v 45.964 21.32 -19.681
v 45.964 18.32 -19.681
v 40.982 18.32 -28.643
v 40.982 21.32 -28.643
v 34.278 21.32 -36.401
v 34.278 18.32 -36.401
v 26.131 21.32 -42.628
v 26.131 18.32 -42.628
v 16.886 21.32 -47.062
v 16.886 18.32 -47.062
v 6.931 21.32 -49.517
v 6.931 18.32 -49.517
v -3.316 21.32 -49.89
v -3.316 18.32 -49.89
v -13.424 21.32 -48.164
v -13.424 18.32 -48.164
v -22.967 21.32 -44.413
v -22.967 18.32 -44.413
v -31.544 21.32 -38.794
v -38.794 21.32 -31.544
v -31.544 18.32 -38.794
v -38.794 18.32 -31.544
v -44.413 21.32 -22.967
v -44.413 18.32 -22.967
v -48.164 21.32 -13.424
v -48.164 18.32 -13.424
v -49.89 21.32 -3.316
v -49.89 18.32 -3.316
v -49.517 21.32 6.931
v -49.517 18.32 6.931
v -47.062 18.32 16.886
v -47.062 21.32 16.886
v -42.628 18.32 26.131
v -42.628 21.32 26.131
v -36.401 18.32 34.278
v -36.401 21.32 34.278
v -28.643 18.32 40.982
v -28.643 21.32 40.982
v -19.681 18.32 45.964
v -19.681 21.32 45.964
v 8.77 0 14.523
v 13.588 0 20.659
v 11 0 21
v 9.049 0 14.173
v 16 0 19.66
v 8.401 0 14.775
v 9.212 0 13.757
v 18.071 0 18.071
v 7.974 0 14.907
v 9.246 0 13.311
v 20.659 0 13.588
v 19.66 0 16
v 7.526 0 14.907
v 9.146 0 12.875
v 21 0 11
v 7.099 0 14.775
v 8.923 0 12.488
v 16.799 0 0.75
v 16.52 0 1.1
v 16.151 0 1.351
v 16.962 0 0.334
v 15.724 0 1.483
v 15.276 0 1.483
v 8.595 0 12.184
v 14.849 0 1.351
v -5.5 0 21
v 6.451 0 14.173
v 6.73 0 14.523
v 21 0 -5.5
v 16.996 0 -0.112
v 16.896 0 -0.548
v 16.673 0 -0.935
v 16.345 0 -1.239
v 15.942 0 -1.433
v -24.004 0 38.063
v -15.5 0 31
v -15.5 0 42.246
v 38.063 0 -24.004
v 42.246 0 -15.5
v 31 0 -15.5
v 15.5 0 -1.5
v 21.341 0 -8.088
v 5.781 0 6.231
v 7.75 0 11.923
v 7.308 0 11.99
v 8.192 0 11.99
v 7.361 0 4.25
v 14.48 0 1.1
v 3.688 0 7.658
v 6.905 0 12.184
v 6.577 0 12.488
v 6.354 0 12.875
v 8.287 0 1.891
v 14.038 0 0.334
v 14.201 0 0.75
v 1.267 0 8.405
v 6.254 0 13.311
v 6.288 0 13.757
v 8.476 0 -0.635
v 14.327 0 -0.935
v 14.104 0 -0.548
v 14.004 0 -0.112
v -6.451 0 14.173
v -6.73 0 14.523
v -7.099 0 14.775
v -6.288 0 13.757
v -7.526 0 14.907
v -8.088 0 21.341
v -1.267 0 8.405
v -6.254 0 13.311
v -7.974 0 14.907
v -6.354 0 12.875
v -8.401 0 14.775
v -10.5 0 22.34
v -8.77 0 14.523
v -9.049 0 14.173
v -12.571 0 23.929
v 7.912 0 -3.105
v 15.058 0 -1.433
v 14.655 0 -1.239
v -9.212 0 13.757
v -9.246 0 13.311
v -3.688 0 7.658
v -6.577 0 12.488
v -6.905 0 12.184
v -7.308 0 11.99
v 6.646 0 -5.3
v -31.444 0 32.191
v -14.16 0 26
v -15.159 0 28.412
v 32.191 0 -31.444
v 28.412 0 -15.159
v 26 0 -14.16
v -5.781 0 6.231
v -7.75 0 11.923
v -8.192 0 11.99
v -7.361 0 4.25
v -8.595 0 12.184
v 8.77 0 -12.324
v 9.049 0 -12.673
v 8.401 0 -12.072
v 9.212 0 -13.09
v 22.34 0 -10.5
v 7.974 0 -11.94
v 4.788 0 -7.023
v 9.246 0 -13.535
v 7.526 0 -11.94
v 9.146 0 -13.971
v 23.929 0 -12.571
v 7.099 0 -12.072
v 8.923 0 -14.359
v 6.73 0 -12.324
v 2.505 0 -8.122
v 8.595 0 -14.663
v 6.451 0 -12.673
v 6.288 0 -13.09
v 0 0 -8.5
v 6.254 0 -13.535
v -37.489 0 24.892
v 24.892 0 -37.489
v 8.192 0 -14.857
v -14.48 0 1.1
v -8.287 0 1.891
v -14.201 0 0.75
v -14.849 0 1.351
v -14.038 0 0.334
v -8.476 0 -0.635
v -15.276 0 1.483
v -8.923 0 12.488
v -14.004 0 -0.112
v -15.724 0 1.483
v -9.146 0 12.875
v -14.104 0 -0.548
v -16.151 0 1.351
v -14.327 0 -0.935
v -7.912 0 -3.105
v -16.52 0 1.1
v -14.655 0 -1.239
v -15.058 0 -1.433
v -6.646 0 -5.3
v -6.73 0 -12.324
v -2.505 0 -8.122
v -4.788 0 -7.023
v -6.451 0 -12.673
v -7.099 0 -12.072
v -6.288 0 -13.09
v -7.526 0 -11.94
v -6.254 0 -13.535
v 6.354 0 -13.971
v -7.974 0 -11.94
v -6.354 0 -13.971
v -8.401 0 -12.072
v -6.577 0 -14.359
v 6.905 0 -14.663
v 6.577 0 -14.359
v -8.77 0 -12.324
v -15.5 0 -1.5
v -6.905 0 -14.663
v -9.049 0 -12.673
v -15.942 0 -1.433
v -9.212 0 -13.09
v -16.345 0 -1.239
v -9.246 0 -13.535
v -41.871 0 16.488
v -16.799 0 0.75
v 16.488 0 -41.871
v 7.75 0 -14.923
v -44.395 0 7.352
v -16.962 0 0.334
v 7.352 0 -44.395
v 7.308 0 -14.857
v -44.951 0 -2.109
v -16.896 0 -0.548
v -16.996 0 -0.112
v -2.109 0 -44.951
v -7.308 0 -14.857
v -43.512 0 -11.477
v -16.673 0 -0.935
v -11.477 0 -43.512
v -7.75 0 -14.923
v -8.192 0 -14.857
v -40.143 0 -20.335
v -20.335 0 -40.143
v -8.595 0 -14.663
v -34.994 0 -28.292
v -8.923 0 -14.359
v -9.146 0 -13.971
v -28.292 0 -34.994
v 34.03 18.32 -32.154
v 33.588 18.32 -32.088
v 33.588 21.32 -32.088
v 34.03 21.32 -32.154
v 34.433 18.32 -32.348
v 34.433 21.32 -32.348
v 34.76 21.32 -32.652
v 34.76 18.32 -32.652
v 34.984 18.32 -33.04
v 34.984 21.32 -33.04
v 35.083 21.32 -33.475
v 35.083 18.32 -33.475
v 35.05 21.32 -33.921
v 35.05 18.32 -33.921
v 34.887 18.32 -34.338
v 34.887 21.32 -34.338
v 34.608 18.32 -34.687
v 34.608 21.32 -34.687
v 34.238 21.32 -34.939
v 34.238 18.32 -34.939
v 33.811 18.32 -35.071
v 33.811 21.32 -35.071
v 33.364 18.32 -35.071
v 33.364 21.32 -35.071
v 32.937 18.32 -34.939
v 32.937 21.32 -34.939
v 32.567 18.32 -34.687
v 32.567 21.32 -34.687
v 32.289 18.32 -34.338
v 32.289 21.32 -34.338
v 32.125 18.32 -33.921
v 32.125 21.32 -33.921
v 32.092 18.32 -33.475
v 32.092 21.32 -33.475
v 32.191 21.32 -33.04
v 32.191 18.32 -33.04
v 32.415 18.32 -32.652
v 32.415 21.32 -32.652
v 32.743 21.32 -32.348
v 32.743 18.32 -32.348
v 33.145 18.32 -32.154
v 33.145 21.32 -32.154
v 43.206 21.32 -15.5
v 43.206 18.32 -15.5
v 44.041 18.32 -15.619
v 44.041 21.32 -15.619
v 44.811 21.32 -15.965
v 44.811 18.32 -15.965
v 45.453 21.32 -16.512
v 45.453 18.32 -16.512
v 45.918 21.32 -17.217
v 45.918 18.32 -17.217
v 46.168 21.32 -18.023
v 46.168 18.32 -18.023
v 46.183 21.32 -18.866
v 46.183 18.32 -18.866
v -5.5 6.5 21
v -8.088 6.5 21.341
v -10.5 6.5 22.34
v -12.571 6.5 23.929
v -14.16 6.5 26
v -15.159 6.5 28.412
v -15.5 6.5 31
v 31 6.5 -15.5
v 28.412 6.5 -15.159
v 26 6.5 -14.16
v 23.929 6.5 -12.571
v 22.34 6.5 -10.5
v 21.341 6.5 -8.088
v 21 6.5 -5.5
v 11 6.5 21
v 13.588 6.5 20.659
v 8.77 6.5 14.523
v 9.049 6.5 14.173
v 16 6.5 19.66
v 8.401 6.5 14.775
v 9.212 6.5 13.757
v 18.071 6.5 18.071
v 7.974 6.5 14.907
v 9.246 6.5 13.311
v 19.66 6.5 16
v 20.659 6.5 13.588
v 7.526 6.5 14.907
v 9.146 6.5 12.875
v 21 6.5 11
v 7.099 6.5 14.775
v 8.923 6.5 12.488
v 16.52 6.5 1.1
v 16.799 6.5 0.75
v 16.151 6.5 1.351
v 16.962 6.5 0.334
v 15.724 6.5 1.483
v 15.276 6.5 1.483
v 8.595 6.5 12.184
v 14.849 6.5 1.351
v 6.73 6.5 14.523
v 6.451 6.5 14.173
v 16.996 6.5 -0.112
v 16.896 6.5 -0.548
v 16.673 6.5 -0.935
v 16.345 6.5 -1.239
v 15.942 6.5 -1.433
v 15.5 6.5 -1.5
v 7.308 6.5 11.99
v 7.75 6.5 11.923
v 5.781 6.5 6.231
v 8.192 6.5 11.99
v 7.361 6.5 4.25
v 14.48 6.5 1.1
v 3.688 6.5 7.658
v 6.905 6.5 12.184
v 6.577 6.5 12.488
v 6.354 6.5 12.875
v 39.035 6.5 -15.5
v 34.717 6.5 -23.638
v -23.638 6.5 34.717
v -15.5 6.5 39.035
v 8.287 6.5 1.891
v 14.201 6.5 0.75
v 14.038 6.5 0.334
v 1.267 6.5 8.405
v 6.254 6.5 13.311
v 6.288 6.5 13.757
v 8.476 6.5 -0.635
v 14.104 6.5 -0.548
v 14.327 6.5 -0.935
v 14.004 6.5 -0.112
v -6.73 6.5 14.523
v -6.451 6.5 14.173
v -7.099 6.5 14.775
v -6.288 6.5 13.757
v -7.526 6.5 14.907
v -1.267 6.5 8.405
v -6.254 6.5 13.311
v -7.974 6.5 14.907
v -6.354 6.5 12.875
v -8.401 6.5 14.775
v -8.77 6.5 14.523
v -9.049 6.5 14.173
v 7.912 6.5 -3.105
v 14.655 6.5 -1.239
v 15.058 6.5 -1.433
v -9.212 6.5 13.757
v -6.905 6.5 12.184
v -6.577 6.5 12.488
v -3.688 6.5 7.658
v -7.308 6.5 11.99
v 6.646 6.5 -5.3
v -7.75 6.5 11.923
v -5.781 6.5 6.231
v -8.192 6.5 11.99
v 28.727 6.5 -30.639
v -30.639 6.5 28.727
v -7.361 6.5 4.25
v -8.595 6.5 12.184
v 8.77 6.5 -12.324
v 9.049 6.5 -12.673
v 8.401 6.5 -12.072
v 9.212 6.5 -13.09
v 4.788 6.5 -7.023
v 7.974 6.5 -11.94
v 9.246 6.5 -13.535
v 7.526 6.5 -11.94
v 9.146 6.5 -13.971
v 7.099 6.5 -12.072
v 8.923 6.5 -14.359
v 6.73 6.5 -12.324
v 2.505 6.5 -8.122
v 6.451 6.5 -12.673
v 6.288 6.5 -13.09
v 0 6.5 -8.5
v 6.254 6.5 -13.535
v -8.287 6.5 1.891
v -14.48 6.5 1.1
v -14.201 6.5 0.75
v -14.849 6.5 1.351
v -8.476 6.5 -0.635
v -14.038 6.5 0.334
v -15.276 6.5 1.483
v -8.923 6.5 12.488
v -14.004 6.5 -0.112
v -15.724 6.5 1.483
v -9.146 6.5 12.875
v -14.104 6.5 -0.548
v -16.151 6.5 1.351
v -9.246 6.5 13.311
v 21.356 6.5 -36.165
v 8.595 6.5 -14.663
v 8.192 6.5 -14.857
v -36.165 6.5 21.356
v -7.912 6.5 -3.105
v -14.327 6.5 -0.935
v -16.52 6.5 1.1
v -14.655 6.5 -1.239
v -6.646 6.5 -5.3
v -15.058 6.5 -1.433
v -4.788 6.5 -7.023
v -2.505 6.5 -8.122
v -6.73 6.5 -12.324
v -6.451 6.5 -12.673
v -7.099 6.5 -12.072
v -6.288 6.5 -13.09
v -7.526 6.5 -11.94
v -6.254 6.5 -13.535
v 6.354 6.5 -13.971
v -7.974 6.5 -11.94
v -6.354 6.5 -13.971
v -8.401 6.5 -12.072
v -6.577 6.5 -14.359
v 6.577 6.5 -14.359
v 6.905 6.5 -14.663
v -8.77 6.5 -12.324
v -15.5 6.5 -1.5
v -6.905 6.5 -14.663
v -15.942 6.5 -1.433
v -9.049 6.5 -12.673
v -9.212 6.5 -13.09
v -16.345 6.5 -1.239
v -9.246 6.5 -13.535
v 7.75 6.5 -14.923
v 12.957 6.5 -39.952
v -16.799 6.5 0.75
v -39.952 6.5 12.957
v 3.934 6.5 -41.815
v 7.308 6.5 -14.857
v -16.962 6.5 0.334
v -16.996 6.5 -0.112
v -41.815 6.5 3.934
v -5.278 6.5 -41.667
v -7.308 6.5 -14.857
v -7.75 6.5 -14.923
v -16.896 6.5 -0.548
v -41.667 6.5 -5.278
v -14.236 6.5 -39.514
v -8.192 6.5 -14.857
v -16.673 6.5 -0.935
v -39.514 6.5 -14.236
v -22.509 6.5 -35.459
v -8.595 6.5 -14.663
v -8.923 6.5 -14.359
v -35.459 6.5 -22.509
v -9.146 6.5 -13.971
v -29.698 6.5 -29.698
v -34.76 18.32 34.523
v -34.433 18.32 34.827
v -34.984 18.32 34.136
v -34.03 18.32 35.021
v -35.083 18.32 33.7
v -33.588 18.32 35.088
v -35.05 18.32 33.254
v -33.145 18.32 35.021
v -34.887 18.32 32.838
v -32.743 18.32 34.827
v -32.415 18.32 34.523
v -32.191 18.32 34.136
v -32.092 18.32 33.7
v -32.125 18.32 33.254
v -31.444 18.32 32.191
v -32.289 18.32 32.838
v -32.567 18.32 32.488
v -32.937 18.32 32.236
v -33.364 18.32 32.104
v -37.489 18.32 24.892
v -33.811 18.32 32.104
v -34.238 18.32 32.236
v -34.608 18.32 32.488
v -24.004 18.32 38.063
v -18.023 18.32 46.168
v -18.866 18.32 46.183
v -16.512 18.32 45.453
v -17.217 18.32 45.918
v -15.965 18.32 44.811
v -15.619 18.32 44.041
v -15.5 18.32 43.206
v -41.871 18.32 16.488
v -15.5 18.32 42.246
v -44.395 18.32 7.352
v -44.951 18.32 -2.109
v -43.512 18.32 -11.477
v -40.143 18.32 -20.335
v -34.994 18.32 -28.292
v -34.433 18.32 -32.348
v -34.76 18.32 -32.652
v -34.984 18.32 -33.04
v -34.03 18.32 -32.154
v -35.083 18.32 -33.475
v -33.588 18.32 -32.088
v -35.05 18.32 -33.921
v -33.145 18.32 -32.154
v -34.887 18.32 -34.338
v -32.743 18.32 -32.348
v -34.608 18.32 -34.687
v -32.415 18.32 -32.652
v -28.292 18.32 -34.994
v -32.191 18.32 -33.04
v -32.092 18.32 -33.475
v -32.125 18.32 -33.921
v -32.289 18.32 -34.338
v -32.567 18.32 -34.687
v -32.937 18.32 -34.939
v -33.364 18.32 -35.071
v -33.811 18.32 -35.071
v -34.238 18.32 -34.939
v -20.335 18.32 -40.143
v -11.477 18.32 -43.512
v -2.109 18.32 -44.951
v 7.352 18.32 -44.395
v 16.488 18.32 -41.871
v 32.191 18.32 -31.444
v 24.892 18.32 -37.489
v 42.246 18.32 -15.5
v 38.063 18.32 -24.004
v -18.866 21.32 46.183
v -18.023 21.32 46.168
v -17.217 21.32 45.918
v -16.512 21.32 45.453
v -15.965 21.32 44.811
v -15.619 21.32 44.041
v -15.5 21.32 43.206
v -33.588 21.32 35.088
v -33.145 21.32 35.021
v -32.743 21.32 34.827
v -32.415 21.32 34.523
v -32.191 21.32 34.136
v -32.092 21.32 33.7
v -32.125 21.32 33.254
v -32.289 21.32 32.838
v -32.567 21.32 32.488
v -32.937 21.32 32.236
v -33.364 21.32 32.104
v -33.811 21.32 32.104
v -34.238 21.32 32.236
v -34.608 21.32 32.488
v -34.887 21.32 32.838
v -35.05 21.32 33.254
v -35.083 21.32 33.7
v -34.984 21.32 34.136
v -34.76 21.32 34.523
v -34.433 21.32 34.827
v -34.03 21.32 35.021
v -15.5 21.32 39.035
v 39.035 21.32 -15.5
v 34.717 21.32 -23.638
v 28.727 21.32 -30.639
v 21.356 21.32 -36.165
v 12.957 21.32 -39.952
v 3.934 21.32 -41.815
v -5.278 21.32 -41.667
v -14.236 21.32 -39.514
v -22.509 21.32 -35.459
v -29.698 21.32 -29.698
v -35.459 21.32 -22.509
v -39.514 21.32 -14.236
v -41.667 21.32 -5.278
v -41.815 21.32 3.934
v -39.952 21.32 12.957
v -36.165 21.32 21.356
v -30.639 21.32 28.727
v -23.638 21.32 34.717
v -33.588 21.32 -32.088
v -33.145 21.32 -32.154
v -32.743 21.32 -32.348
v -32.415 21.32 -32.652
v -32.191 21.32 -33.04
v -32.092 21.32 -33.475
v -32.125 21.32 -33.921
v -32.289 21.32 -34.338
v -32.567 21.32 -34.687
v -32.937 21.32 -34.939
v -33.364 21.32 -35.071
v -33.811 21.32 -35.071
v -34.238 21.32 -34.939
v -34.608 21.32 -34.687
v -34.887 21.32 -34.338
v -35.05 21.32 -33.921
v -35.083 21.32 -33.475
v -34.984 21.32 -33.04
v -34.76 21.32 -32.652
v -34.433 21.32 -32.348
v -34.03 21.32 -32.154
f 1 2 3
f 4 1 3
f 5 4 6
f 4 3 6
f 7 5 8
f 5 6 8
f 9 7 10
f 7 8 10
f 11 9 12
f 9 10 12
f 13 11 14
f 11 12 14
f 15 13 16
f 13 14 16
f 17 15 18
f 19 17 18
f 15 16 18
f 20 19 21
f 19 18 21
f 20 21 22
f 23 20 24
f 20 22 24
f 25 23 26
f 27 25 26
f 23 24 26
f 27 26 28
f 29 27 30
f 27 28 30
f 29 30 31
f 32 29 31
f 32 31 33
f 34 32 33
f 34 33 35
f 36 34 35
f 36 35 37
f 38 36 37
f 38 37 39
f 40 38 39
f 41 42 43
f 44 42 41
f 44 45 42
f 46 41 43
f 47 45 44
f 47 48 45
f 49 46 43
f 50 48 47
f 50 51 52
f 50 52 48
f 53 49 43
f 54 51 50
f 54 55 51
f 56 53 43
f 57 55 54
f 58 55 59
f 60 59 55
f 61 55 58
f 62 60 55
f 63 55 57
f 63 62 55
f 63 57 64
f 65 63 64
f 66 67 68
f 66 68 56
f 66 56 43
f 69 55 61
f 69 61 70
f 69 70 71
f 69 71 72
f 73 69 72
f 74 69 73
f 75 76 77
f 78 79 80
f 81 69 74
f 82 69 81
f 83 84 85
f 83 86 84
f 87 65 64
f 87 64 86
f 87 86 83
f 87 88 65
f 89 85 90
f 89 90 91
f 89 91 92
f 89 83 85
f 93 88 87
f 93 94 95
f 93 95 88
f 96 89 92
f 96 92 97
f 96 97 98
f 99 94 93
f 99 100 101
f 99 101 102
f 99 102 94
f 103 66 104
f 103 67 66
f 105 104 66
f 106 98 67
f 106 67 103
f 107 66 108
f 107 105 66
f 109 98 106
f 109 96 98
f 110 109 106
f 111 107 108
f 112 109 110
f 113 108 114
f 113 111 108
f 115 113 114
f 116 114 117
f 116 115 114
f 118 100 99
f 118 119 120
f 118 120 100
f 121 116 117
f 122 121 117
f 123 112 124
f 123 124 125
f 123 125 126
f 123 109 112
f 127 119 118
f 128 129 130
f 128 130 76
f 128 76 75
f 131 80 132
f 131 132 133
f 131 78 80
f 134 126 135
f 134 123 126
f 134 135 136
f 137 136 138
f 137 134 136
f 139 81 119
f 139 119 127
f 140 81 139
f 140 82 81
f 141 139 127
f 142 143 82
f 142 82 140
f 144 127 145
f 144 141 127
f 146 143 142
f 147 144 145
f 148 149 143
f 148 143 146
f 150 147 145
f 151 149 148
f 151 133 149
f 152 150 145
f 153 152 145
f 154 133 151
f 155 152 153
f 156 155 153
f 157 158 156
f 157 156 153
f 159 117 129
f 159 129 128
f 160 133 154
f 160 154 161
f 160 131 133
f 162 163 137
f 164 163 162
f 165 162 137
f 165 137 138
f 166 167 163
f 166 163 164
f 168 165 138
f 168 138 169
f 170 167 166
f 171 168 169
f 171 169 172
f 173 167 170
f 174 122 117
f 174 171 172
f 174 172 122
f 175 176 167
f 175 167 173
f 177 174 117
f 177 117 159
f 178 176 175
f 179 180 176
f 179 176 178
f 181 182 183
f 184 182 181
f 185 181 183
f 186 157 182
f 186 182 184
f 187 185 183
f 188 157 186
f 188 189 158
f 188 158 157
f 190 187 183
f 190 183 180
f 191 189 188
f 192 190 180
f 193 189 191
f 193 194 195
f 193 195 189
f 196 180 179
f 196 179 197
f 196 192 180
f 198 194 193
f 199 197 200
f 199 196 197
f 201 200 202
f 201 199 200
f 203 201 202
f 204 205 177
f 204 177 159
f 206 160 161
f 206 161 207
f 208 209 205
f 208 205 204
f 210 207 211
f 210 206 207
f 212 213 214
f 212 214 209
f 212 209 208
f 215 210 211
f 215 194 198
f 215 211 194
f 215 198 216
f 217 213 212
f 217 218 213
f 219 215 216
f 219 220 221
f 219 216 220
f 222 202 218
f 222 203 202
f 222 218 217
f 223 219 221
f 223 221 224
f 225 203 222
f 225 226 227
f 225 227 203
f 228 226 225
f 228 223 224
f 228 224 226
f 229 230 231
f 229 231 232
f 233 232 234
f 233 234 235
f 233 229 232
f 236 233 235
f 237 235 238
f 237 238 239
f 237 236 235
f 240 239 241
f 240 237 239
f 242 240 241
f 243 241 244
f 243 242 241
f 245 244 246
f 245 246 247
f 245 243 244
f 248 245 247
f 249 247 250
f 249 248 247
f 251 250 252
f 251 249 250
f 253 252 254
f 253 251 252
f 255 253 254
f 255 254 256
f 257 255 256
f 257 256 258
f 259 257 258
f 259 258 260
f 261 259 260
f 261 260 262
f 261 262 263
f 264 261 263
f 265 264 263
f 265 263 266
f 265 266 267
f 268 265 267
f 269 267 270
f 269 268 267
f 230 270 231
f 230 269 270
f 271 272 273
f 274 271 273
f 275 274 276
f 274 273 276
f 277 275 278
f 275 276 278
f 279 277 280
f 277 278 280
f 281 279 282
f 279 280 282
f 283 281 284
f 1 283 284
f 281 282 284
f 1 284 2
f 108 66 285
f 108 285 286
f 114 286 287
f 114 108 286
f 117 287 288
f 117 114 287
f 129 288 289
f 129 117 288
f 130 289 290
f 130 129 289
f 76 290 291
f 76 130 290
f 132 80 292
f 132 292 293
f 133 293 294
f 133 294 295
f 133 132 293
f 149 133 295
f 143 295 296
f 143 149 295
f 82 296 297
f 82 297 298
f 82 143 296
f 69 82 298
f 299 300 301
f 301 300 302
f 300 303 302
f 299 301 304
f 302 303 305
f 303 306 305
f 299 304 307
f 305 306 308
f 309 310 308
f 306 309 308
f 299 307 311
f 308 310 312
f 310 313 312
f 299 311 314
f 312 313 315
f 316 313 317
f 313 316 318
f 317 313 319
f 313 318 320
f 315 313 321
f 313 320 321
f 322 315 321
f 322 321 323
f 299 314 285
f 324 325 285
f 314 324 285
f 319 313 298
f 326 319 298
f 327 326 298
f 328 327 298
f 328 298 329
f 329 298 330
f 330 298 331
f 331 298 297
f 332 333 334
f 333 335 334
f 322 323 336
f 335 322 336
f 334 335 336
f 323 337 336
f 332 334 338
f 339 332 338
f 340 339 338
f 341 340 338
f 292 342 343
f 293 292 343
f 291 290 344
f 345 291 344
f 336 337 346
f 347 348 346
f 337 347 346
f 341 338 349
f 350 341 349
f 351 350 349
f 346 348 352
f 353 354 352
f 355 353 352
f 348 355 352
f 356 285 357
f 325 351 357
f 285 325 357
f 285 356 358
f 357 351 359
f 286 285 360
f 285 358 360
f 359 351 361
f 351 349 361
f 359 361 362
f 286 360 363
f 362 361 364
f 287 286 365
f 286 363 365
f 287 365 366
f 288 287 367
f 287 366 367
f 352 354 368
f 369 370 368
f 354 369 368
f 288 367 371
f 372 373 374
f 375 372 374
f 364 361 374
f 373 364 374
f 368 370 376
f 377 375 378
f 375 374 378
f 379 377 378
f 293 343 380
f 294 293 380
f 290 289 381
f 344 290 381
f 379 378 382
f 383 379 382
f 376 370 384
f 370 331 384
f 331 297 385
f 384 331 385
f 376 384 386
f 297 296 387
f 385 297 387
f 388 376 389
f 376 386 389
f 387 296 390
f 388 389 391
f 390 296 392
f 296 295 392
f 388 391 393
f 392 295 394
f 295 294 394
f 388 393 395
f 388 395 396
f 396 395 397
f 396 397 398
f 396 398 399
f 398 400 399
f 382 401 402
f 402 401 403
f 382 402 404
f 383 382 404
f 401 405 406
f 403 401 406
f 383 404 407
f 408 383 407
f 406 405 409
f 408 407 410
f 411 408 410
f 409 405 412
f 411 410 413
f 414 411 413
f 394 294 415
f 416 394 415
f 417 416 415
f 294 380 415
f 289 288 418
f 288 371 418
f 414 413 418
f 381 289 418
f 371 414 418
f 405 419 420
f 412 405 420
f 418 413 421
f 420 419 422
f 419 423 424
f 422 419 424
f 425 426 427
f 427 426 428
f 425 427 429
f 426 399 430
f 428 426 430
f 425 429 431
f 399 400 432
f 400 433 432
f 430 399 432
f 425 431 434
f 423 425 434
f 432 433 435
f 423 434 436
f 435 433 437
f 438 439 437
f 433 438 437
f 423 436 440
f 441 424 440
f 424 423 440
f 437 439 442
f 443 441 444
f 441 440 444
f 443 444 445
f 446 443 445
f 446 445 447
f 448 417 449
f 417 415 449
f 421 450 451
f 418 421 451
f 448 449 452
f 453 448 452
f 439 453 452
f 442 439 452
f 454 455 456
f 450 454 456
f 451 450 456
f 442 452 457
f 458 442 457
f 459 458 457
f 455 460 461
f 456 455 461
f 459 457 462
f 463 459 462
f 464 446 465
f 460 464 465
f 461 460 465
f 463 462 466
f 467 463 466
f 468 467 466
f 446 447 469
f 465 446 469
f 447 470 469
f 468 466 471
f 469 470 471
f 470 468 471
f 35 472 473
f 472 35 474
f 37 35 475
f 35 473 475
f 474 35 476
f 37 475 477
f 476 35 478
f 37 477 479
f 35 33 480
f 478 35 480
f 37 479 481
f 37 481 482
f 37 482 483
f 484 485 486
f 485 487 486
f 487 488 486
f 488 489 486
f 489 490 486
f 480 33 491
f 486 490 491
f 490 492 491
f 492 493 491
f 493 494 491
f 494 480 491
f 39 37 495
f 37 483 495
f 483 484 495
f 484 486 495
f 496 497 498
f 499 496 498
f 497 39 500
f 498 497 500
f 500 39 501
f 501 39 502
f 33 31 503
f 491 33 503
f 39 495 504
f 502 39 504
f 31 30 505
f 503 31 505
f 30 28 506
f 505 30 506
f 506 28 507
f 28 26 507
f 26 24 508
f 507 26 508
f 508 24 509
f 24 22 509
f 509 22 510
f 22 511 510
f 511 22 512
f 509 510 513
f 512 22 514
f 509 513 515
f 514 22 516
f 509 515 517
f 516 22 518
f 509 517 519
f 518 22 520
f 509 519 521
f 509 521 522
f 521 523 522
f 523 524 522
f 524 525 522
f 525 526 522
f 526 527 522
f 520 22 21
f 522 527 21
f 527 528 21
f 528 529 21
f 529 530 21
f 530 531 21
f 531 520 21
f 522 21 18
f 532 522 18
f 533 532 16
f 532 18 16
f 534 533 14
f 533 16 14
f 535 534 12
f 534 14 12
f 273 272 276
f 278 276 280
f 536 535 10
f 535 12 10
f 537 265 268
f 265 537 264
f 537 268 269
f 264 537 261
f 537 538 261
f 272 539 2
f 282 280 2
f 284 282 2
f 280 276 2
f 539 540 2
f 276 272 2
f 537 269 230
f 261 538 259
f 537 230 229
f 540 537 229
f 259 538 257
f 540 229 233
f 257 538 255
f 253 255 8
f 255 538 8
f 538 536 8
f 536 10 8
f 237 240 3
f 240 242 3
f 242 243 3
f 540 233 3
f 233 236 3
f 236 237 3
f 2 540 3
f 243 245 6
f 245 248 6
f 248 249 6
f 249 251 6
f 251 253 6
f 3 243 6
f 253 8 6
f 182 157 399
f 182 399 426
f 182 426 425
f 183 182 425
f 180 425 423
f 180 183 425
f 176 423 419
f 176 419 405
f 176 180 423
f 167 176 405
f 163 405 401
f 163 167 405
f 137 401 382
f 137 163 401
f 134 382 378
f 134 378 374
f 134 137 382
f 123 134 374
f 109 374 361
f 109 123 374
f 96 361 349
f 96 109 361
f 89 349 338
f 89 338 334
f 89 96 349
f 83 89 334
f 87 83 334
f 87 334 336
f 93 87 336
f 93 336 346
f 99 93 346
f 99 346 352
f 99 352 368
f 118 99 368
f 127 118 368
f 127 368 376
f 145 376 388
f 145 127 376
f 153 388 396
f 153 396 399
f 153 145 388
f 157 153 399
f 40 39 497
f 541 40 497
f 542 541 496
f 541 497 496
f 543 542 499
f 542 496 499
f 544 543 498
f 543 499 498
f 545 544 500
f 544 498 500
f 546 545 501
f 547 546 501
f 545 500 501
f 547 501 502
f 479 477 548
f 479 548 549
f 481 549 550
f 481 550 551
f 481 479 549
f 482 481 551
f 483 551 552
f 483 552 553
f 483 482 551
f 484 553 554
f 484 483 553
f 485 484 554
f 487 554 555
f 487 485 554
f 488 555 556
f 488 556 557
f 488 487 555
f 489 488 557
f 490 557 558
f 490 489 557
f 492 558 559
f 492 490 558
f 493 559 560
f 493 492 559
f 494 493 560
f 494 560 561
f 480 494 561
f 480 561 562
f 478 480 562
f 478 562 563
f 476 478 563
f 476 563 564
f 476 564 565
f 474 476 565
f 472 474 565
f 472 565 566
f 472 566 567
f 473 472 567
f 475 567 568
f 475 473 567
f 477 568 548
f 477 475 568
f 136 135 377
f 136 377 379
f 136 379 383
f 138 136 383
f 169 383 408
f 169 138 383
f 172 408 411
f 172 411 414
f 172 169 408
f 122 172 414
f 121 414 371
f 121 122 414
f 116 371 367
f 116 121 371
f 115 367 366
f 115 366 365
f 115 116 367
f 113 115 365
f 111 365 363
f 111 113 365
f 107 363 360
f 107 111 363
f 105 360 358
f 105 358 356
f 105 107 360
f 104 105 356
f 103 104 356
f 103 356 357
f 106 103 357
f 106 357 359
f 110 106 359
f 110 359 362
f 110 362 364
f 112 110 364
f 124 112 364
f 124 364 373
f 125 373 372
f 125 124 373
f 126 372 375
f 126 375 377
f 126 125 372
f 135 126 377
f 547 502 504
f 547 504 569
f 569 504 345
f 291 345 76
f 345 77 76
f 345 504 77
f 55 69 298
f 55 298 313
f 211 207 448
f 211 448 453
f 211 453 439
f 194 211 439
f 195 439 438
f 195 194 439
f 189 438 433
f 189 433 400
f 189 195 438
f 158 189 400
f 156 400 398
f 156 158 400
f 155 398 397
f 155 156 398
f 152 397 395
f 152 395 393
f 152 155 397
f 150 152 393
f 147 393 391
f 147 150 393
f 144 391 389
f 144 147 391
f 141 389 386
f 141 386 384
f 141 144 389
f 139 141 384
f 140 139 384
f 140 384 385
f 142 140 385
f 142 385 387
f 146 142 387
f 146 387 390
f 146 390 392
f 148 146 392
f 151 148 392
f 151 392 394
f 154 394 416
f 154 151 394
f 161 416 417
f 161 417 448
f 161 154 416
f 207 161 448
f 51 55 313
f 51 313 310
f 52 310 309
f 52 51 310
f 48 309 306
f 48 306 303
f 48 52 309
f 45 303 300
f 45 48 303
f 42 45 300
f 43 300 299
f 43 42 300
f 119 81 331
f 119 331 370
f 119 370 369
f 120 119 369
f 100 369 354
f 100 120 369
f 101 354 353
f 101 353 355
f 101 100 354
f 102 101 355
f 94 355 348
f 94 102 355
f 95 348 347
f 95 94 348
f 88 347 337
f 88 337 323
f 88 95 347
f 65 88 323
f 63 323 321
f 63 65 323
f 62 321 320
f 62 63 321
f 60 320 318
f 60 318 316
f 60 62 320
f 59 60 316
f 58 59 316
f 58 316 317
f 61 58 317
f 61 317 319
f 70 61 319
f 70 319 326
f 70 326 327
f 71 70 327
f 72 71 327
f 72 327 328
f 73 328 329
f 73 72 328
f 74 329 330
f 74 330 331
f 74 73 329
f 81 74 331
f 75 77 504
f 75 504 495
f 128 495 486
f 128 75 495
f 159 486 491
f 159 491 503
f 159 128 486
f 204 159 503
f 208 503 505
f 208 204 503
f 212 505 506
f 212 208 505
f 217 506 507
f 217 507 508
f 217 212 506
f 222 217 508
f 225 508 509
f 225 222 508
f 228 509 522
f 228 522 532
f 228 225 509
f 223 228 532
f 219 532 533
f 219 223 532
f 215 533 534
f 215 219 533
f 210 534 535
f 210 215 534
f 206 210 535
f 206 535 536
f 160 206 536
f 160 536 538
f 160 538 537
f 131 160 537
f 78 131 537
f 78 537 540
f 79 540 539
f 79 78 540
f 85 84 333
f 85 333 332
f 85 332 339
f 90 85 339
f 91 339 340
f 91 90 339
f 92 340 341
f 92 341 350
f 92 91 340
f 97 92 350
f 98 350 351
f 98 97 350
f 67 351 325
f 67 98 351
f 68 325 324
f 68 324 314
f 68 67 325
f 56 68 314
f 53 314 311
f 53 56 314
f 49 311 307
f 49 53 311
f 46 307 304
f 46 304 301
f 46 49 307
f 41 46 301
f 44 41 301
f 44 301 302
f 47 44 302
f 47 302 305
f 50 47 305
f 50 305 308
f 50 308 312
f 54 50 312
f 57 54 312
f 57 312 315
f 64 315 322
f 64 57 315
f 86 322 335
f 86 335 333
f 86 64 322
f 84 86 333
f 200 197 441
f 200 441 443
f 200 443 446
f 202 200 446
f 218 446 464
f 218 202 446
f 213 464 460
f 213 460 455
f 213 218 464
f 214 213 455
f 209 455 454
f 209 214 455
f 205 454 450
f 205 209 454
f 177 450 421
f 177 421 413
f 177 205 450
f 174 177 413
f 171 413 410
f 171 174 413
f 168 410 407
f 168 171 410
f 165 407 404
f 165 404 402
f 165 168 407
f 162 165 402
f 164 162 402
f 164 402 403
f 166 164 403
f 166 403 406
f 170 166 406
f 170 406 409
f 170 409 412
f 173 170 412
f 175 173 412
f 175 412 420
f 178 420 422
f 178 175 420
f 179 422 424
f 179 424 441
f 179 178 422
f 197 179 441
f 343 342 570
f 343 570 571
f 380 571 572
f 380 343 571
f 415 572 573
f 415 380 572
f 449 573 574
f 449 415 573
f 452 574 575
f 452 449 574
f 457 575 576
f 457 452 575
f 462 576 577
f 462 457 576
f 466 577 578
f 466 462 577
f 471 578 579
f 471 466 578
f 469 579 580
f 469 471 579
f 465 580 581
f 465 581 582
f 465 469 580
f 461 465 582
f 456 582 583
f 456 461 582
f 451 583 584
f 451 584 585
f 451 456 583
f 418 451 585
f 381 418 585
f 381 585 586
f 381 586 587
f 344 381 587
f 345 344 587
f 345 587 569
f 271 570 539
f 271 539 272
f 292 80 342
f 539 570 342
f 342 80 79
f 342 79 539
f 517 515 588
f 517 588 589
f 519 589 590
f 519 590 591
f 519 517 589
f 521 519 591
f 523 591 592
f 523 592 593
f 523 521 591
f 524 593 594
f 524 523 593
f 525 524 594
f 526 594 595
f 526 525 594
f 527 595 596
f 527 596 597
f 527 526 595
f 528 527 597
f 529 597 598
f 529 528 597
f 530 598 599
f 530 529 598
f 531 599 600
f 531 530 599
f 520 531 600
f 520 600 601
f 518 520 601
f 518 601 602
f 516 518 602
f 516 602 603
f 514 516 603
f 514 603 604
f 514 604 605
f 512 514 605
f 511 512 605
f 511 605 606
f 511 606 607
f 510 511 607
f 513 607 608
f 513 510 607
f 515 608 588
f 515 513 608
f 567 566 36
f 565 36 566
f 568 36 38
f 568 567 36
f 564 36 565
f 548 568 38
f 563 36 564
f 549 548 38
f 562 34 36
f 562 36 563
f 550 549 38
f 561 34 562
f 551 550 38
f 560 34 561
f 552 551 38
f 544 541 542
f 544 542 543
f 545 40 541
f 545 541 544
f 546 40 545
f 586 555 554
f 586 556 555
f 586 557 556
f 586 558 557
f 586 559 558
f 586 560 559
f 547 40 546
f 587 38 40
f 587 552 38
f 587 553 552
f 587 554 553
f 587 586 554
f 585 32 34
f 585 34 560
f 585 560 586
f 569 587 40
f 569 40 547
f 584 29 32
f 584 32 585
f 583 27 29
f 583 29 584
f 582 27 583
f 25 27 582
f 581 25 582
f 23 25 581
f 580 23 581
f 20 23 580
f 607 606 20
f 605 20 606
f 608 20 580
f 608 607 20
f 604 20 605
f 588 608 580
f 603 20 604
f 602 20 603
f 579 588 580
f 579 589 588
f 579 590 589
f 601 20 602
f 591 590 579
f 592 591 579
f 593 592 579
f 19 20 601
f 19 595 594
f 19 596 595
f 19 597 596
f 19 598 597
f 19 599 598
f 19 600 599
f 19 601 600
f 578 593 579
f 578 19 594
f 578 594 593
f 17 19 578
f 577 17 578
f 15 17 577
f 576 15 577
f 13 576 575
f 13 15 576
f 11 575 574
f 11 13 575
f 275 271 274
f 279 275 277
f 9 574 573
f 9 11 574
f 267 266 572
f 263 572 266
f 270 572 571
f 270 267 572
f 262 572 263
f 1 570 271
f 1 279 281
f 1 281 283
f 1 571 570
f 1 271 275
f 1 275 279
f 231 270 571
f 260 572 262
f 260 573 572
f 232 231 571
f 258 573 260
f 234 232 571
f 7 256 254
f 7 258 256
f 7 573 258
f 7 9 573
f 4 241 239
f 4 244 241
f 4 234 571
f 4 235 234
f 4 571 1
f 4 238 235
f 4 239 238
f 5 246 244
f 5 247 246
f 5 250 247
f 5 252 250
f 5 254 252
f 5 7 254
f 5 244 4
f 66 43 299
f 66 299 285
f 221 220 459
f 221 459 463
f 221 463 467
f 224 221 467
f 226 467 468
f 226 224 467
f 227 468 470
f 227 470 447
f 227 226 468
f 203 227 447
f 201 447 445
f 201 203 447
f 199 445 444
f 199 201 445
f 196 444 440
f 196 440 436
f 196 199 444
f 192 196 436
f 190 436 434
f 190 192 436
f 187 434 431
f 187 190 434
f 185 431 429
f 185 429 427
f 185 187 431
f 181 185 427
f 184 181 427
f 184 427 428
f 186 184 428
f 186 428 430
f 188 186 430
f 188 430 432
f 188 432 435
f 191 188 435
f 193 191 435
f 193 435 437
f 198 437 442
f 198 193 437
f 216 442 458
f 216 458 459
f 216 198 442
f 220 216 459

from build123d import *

# Parameters (mm, degrees)
SKETCH1_R           = 8.5
SKETCH1_R_2         = 1.5
BOSS_EXTRUDE1_DEPTH = 6.5
BOSS_EXTRUDE3_DEPTH = 14.82
BOSS_EXTRUDE4_START = -3
SKETCH4_R           = 1.5
BOSS_EXTRUDE4_DEPTH = 3


with BuildPart() as part:
    # Sketch1 → Boss-Extrude1 (new body)
    with BuildSketch(Plane(origin=(0, 0, 0), x_dir=(1, 0, 0), z_dir=(0, 1, 0))):
        with BuildLine():
            Line((-15.5, -31), (-15.5, -42.246301613))
            ThreePointArc((-15.5, -42.246301613), (-31.819805153, 31.819805153), (42.246301613, 15.5))
            Line((42.246301613, 15.5), (31, 15.5))
            ThreePointArc((31, 15.5), (23.928932188, 12.571067812), (21, 5.5))
            Line((21, 5.5), (21, -11))
            ThreePointArc((21, -11), (18.071067812, -18.071067812), (11, -21))
            Line((11, -21), (-5.5, -21))
            ThreePointArc((-5.5, -21), (-12.571067812, -23.928932188), (-15.5, -31))
        make_face()
        with Locations(Location((0, 0, 0), (0, 0, 90))):
            Circle(SKETCH1_R, mode=Mode.SUBTRACT)
        with Locations(Location((-7.75, 13.423393759, 0), (0, 0, 90))):
            Circle(SKETCH1_R_2, mode=Mode.SUBTRACT)
        with Locations(Location((7.75, 13.423393759, 0), (0, 0, 90))):
            Circle(SKETCH1_R_2, mode=Mode.SUBTRACT)
        with Locations(Location((15.5, 0, 0), (0, 0, 90))):
            Circle(SKETCH1_R_2, mode=Mode.SUBTRACT)
        with Locations(Location((-15.5, 0, 0), (0, 0, 90))):
            Circle(SKETCH1_R_2, mode=Mode.SUBTRACT)
        with Locations(Location((-7.75, -13.423393759, 0), (0, 0, 90))):
            Circle(SKETCH1_R_2, mode=Mode.SUBTRACT)
        with Locations(Location((7.75, -13.423393759, 0), (0, 0, 90))):
            Circle(SKETCH1_R_2, mode=Mode.SUBTRACT)
    extrude(amount=BOSS_EXTRUDE1_DEPTH)

    # Sketch3 → Boss-Extrude3 (add)
    with BuildSketch(Plane(origin=(0, 6.5, 0), x_dir=(1, 0, 0), z_dir=(0, 1, 0))):
        with BuildLine():
            Line((42.246301613, 15.5), (39.035240489, 15.5))
            ThreePointArc((39.035240489, 15.5), (-29.69848481, 29.69848481), (-15.5, -39.035240489))
            Line((-15.5, -39.035240489), (-15.5, -42.246301613))
            ThreePointArc((-15.5, -42.246301613), (-31.819805153, 31.819805153), (42.246301613, 15.5))
        make_face()
    extrude(amount=BOSS_EXTRUDE3_DEPTH)

    # Sketch4 → Boss-Extrude4 (add)
    with BuildSketch(Plane(origin=(0, 21.32, 0), x_dir=(1, 0, 0), z_dir=(0, 1, 0)).offset(BOSS_EXTRUDE4_START)):
        with BuildLine():
            Line((42.246301613, 15.5), (43.205902375, 15.5))
            ThreePointArc((43.205902375, 15.5), (45.710154078, 16.848115196), (45.96372593, 19.680851064))
            ThreePointArc((45.96372593, 19.680851064), (-35.355339059, 35.355339059), (-19.680851064, -45.96372593))
            ThreePointArc((-19.680851064, -45.96372593), (-16.848115196, -45.710154078), (-15.5, -43.205902375))
            Line((-15.5, -43.205902375), (-15.5, -42.246301613))
            ThreePointArc((-15.5, -42.246301613), (-31.819805153, 31.819805153), (42.246301613, 15.5))
        make_face()
        with Locations(Location((-33.587572106, 33.587572106, 0), (0, 0, 270))):
            Circle(SKETCH4_R, mode=Mode.SUBTRACT)
        with Locations(Location((-33.587572106, -33.587572106, 0), (0, 0, 270))):
            Circle(SKETCH4_R, mode=Mode.SUBTRACT)
        with Locations(Location((33.587572106, 33.587572106, 0), (0, 0, 270))):
            Circle(SKETCH4_R, mode=Mode.SUBTRACT)
    extrude(amount=BOSS_EXTRUDE4_DEPTH)


solid = part.part
